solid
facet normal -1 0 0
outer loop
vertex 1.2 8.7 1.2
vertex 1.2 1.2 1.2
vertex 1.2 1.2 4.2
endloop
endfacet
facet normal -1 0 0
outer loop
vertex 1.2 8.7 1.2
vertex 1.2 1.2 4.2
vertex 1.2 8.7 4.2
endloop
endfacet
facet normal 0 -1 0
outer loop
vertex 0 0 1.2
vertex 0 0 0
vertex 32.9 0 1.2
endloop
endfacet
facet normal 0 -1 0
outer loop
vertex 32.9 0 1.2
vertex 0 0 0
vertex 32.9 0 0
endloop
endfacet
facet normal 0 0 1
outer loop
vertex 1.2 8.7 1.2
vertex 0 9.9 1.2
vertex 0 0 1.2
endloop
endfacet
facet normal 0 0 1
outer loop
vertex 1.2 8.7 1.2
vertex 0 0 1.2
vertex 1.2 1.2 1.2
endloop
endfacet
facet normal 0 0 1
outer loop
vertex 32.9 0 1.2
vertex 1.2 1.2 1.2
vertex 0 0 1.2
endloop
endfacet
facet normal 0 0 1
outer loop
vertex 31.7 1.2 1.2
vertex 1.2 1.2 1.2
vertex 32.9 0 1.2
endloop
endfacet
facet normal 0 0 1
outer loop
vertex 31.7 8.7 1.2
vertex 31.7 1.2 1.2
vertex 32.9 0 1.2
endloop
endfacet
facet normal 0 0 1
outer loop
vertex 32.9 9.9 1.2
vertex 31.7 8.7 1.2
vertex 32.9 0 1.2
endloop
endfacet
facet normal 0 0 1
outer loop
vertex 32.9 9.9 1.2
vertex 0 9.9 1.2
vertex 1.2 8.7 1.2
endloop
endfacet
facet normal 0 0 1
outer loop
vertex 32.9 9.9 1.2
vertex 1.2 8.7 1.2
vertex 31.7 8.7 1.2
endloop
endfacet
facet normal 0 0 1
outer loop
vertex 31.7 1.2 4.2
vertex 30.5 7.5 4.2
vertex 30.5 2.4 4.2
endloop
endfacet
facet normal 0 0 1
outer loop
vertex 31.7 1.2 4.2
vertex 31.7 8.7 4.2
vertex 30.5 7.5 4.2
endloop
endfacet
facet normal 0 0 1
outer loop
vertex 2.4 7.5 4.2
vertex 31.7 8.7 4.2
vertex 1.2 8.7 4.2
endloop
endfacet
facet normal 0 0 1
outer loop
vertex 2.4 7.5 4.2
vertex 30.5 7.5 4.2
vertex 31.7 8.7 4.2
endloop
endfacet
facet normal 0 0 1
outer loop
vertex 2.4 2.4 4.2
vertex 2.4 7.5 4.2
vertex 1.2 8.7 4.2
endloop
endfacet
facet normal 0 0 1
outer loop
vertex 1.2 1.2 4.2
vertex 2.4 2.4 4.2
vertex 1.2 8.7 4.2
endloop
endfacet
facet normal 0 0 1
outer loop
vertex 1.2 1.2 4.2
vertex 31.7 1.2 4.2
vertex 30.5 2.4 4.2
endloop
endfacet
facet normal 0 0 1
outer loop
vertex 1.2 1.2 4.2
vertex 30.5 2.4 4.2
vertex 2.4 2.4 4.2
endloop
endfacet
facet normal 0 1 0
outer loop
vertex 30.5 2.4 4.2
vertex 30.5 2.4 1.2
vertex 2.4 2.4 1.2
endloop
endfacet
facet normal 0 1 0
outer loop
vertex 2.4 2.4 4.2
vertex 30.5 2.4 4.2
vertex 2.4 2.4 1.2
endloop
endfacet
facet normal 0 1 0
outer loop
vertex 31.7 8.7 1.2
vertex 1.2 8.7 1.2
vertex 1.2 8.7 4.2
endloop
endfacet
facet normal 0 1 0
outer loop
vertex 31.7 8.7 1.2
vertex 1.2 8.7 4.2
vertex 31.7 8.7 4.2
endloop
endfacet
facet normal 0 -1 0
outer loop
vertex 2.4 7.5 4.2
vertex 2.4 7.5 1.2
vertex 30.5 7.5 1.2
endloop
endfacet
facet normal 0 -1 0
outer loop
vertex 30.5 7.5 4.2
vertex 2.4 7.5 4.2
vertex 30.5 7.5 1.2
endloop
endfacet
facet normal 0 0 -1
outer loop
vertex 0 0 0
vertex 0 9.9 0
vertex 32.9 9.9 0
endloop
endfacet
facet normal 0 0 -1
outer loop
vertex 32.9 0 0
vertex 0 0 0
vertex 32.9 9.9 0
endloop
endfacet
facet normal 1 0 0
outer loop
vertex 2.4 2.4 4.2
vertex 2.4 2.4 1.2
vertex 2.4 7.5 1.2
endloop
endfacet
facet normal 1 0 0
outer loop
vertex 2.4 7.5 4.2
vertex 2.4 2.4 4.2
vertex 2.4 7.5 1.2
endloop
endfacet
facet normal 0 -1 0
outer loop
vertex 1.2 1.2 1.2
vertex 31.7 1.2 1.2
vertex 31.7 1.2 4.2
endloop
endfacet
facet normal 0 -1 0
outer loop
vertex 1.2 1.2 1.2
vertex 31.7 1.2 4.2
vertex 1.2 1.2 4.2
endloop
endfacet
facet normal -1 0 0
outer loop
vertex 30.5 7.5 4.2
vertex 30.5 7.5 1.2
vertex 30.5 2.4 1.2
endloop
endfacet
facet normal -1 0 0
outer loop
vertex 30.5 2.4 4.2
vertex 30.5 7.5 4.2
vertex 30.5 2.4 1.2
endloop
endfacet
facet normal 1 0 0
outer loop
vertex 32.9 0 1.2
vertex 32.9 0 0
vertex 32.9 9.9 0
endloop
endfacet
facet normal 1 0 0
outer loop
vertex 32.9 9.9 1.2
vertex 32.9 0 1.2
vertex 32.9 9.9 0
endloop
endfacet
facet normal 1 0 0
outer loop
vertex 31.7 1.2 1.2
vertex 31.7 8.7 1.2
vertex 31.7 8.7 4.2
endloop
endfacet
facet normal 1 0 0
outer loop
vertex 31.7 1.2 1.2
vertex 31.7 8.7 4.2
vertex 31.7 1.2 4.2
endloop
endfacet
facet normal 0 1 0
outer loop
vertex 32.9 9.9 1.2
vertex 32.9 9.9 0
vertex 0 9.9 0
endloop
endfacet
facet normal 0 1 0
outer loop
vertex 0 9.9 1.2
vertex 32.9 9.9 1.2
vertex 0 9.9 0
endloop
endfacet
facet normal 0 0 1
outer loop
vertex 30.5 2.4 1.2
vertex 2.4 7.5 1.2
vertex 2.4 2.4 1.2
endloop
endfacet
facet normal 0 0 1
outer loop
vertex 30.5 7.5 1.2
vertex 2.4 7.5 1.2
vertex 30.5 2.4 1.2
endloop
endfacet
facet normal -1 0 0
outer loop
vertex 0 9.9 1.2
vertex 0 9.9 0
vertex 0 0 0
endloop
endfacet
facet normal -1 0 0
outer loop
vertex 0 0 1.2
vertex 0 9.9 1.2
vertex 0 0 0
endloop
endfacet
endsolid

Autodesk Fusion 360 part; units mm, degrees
sketch "Sketch1" plane through (0, 0, 0) normal (0, 0, 1) x (1, 0, 0)
  line L0 (0, 0) -> (32.9, 0)
  line L1 (32.9, 0) -> (32.9, 9.9)
  line L2 (32.9, 9.9) -> (0, 9.9)
  line L3 (0, 9.9) -> (0, 0)
  dimension "d1" = 32.9
  dimension "d2" = 9.9
extrude "Extrude1" add sketch "Sketch1" along normal blind 1.2
sketch "Sketch2" plane through (0, 0, 1.2) normal (0, 0, 1) x (-1, 0, 0)
  line L0 (0, -9.9) -> (0, 0)
  line L1 (0, 0) -> (-32.9, 0)
  line L2 (-32.9, 0) -> (-32.9, -9.9)
  line L3 (-32.9, -9.9) -> (0, -9.9)
  line L4 (-1.2, -8.7) -> (-31.7, -8.7)
  line L5 (-31.7, -8.7) -> (-31.7, -1.2)
  line L6 (-31.7, -1.2) -> (-1.2, -1.2)
  line L7 (-1.2, -1.2) -> (-1.2, -8.7)
  line L8 (-2.4, -7.5) -> (-30.5, -7.5)
  line L9 (-30.5, -7.5) -> (-30.5, -2.4)
  line L10 (-30.5, -2.4) -> (-2.4, -2.4)
  line L11 (-2.4, -2.4) -> (-2.4, -7.5)
  dimension "d5" = 1.2
  dimension "d6" = 1.2
  dimension "d7" = 1.2
  dimension "d8" = 1.2
  dimension "d9" = 1.2
  dimension "d10" = 1.2
  dimension "d11" = 1.2
  dimension "d12" = 1.2
extrude "Extrude2" add sketch "Sketch2" along normal blind 3 contours L4 L5 L6 L7
equation "d7 = d5"
equation "d8 = d6"
equation "d9 = d5"
equation "d10 = d6"
equation "d11 = d8"
equation "d12 = d7"
